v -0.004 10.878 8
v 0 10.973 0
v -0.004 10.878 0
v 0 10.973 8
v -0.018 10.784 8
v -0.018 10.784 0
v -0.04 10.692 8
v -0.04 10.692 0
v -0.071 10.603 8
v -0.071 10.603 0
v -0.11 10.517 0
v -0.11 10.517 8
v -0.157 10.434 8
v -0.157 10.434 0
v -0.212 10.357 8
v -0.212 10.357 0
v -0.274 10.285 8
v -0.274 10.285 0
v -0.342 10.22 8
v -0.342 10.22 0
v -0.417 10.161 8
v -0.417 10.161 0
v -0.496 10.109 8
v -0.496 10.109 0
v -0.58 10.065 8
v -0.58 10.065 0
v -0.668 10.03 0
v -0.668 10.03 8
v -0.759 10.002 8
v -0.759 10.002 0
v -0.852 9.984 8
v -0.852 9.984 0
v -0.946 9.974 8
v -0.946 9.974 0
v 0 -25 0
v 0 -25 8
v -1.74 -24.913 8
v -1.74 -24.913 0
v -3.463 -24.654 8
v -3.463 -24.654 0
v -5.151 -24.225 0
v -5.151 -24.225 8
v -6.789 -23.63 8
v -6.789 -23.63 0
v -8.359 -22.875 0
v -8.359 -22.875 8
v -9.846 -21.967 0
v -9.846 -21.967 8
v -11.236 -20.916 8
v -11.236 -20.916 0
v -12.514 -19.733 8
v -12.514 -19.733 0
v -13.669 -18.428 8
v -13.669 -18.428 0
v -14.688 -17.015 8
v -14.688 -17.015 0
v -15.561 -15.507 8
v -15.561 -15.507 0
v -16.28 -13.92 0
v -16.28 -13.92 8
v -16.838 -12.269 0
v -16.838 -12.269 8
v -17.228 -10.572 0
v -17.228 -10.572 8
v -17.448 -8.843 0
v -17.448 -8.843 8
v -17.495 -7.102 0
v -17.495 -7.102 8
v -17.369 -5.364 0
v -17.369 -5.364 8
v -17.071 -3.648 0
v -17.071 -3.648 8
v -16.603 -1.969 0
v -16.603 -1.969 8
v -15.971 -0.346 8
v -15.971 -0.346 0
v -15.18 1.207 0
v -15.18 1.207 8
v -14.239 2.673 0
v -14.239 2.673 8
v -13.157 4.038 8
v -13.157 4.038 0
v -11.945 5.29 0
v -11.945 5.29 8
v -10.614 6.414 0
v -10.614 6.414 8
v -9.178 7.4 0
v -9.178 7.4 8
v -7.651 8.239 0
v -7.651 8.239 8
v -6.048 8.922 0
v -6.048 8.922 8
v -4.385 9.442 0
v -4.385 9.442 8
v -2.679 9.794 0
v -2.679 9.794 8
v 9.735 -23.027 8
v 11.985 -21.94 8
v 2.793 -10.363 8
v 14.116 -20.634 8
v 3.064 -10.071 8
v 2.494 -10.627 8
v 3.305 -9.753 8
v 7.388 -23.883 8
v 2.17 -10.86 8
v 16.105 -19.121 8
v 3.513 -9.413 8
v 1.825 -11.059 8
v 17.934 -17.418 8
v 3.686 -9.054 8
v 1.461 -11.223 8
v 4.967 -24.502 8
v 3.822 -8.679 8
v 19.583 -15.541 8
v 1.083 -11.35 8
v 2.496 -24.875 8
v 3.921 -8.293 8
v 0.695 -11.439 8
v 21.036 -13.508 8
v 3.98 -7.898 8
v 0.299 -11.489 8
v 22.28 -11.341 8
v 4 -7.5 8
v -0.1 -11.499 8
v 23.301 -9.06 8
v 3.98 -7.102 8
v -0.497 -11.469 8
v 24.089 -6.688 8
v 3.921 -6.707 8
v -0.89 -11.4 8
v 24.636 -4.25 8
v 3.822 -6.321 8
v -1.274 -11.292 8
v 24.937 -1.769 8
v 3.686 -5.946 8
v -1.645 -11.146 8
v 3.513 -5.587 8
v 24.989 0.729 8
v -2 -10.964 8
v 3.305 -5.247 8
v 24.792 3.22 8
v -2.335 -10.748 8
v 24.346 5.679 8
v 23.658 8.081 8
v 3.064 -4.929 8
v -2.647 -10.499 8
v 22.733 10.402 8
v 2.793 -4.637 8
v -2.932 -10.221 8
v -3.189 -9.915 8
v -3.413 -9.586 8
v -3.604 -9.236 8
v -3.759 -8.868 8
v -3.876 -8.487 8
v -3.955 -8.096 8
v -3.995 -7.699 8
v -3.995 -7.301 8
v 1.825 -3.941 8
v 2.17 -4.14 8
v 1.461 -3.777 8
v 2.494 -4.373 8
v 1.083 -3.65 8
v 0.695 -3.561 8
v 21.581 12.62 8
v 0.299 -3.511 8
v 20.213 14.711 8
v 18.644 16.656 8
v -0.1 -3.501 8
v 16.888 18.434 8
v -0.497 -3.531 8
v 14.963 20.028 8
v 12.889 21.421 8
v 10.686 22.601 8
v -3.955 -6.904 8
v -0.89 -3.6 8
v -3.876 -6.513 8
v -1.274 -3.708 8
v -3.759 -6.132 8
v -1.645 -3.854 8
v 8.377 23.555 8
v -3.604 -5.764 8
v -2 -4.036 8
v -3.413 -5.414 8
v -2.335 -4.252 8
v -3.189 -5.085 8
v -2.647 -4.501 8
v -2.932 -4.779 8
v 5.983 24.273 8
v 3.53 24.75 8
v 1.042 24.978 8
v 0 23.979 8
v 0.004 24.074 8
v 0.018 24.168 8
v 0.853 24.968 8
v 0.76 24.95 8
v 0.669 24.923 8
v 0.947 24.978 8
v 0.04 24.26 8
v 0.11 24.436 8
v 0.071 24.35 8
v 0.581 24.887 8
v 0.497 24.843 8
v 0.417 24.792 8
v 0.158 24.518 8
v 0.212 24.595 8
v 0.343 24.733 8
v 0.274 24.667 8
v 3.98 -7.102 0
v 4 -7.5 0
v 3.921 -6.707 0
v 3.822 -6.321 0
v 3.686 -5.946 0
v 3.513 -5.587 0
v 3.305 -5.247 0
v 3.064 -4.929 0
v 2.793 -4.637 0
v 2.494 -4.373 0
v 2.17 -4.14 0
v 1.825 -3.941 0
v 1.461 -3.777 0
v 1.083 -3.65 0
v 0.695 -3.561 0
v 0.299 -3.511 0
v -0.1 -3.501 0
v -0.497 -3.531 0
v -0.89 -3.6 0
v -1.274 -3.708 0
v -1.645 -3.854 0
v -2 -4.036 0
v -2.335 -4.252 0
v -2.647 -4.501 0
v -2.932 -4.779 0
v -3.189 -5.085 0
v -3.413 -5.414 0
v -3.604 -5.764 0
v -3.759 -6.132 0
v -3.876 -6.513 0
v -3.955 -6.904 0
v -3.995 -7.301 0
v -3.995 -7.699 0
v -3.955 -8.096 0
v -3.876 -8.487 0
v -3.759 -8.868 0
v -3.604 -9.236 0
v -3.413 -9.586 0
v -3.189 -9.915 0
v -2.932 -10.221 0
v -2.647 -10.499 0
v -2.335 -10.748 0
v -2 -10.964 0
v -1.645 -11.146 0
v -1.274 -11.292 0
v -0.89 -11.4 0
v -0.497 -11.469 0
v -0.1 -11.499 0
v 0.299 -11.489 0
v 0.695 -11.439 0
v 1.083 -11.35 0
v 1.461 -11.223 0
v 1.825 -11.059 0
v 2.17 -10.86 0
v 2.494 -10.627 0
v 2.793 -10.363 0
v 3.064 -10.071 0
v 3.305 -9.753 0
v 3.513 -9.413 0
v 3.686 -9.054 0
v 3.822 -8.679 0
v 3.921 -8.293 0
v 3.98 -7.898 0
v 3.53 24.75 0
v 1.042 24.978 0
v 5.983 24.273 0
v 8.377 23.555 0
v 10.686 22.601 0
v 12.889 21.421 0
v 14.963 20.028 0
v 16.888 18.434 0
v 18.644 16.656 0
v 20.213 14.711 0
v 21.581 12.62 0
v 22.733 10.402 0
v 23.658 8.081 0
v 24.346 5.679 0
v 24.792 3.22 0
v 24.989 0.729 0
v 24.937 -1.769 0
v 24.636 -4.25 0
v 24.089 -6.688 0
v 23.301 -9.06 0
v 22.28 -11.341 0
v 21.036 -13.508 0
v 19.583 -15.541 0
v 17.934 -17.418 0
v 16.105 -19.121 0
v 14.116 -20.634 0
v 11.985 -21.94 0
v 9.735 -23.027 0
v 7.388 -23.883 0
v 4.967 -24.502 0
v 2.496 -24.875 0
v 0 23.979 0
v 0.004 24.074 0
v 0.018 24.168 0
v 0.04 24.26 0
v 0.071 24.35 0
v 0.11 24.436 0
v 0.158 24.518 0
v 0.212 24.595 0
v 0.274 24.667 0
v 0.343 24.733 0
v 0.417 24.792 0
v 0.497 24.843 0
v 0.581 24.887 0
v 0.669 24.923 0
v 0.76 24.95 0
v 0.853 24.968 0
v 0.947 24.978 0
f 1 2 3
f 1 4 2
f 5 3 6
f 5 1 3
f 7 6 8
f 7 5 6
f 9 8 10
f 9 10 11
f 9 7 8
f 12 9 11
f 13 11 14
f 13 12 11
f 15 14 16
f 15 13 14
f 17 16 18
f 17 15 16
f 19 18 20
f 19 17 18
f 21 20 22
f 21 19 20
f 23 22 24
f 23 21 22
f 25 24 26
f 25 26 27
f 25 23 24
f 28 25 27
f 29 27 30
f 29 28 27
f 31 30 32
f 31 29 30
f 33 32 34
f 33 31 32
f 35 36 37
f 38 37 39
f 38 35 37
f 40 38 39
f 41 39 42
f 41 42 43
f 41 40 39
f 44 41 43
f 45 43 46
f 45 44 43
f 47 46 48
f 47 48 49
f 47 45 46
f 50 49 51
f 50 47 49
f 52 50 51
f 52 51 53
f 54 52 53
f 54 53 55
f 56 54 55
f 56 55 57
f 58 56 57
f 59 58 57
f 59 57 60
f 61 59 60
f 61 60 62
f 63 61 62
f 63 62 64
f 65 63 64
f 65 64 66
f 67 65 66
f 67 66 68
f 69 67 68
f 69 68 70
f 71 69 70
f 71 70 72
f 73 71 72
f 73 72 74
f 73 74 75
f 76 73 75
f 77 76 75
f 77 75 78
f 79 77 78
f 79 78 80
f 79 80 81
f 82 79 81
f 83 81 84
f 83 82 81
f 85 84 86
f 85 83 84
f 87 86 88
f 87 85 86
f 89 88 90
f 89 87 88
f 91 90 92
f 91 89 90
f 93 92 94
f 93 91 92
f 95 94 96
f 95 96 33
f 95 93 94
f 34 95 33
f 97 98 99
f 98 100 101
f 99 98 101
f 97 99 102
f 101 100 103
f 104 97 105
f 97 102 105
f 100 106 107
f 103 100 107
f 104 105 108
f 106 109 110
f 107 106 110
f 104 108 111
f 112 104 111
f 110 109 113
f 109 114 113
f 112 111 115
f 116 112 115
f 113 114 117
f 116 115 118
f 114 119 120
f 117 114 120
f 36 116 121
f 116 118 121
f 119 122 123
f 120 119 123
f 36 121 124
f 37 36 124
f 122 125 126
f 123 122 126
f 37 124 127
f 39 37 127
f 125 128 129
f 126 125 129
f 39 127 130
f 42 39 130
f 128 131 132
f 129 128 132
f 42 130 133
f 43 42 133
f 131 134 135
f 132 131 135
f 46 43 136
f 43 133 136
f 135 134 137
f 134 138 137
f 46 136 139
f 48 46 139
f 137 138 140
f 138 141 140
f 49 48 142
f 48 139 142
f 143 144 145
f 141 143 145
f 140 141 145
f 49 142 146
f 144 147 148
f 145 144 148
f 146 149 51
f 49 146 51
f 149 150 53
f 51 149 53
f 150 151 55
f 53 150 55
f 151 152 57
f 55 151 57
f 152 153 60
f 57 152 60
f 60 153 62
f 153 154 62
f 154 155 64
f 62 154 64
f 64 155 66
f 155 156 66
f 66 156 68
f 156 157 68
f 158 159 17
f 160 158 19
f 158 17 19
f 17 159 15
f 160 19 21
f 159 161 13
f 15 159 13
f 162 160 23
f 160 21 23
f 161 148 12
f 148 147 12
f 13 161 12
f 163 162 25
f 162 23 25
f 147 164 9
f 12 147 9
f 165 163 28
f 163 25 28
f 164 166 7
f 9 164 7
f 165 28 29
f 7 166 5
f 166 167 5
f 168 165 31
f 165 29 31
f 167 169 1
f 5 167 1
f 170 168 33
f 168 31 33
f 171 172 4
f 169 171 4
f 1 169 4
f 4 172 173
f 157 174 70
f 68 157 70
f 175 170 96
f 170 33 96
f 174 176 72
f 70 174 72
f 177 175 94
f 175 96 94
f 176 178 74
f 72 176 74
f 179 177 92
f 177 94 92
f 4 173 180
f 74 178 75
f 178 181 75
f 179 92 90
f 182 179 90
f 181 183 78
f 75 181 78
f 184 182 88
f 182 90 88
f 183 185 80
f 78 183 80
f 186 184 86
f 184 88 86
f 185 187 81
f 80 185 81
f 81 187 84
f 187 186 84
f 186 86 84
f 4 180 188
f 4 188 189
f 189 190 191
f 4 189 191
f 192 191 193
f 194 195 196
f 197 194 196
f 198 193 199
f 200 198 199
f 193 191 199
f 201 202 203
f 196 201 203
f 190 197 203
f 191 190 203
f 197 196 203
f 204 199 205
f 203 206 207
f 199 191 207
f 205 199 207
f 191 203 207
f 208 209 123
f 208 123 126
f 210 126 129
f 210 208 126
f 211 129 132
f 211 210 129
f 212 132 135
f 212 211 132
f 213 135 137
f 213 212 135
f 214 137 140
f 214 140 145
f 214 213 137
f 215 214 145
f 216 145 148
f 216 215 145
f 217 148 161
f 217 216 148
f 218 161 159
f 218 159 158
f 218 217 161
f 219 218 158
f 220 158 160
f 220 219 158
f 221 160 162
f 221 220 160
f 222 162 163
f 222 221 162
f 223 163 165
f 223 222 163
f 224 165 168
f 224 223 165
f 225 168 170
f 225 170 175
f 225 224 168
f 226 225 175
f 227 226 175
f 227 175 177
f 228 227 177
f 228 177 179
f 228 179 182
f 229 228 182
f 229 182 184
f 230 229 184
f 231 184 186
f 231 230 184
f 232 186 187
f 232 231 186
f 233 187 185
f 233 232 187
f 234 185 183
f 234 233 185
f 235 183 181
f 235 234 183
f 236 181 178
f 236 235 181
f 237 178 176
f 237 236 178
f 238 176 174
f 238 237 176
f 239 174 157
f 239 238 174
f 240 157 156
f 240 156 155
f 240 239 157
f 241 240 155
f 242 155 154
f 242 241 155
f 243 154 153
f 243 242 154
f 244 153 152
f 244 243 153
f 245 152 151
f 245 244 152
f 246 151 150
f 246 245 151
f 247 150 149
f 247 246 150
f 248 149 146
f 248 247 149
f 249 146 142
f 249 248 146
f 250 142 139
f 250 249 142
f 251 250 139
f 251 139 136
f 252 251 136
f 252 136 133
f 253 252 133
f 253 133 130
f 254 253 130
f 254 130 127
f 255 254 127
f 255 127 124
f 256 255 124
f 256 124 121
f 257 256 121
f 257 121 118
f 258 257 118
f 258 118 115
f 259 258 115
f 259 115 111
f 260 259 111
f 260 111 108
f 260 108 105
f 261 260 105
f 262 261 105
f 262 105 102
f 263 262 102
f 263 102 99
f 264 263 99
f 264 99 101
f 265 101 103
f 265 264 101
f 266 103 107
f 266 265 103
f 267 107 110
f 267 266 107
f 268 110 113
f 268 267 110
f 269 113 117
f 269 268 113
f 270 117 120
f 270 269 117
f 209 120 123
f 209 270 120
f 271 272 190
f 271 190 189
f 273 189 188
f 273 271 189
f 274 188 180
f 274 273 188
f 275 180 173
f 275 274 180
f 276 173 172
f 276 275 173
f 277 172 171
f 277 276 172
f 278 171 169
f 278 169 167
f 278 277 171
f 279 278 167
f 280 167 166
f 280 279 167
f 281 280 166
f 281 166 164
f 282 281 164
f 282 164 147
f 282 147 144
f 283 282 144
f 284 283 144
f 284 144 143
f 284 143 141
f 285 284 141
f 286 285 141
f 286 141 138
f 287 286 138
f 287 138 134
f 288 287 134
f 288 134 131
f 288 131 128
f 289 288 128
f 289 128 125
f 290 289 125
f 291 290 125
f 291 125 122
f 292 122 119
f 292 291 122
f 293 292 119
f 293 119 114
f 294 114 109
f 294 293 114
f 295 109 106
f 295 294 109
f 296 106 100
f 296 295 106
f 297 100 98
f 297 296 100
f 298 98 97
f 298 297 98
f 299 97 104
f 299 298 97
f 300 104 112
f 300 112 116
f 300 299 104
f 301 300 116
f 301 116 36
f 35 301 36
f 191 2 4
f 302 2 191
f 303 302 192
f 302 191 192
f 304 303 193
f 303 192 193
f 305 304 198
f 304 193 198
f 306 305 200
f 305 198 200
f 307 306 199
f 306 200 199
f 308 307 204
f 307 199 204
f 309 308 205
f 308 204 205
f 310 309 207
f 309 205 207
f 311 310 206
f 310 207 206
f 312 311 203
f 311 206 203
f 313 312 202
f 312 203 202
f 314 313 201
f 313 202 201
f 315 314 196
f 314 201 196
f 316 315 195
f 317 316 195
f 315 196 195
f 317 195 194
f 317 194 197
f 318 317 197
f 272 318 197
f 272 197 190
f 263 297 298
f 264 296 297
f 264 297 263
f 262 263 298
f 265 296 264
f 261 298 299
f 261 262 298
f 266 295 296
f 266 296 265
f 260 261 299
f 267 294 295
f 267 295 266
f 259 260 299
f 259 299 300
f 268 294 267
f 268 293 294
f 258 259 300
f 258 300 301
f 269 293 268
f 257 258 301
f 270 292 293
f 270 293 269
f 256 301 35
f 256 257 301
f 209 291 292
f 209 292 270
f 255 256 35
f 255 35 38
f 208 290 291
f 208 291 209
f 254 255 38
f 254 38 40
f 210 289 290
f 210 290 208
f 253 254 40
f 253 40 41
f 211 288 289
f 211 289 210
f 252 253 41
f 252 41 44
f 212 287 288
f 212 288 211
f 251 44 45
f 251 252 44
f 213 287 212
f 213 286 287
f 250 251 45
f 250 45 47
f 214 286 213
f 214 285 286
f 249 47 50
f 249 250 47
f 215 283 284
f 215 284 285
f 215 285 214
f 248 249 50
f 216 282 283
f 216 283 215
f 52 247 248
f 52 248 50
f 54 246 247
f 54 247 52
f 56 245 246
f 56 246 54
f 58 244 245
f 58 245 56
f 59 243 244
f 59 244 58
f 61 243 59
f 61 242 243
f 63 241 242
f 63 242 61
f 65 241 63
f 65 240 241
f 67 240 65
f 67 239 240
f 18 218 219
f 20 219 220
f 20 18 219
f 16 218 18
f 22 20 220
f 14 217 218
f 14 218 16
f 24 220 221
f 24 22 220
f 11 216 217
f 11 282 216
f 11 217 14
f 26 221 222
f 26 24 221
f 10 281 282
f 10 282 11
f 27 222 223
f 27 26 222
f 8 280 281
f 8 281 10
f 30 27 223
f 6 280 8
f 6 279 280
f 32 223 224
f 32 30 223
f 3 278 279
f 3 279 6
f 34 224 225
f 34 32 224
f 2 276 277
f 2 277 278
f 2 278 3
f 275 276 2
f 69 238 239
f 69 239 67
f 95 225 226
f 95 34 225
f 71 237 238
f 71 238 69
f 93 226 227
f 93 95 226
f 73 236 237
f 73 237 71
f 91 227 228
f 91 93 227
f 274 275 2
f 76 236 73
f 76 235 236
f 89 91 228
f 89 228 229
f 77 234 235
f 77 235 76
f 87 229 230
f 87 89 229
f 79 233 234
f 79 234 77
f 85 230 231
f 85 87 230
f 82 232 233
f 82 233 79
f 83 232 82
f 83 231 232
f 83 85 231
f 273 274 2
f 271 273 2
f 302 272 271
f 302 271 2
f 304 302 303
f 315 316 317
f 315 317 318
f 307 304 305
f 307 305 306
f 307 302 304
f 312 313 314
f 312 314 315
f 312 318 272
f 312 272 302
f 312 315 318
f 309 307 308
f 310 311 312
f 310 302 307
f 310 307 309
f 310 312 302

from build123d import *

# Parameters (mm, degrees)
SKETCH1_R           = 4
BOSS_EXTRUDE1_DEPTH = 8
FILLET1_R           = 1


with BuildPart() as part:
    # Sketch1 → Boss-Extrude1 (new body)
    with BuildSketch(Plane.XY):
        with BuildLine():
            Line((0, 10), (0, 25))
            ThreePointArc((0, 25), (25, 0), (0, -25))
            ThreePointArc((0, -25), (-17.5, -7.5), (0, 10))
        make_face()
        with Locations((0, -7.5)):
            Circle(SKETCH1_R, mode=Mode.SUBTRACT)
    extrude(amount=BOSS_EXTRUDE1_DEPTH)

    # Fillet1
    fillet1_edges = [part.edges().sort_by_distance(p)[0] for p in [
        (0, 10, 4),
        (0, 25, 4),
    ]]
    fillet(fillet1_edges, radius=FILLET1_R)


solid = part.part
